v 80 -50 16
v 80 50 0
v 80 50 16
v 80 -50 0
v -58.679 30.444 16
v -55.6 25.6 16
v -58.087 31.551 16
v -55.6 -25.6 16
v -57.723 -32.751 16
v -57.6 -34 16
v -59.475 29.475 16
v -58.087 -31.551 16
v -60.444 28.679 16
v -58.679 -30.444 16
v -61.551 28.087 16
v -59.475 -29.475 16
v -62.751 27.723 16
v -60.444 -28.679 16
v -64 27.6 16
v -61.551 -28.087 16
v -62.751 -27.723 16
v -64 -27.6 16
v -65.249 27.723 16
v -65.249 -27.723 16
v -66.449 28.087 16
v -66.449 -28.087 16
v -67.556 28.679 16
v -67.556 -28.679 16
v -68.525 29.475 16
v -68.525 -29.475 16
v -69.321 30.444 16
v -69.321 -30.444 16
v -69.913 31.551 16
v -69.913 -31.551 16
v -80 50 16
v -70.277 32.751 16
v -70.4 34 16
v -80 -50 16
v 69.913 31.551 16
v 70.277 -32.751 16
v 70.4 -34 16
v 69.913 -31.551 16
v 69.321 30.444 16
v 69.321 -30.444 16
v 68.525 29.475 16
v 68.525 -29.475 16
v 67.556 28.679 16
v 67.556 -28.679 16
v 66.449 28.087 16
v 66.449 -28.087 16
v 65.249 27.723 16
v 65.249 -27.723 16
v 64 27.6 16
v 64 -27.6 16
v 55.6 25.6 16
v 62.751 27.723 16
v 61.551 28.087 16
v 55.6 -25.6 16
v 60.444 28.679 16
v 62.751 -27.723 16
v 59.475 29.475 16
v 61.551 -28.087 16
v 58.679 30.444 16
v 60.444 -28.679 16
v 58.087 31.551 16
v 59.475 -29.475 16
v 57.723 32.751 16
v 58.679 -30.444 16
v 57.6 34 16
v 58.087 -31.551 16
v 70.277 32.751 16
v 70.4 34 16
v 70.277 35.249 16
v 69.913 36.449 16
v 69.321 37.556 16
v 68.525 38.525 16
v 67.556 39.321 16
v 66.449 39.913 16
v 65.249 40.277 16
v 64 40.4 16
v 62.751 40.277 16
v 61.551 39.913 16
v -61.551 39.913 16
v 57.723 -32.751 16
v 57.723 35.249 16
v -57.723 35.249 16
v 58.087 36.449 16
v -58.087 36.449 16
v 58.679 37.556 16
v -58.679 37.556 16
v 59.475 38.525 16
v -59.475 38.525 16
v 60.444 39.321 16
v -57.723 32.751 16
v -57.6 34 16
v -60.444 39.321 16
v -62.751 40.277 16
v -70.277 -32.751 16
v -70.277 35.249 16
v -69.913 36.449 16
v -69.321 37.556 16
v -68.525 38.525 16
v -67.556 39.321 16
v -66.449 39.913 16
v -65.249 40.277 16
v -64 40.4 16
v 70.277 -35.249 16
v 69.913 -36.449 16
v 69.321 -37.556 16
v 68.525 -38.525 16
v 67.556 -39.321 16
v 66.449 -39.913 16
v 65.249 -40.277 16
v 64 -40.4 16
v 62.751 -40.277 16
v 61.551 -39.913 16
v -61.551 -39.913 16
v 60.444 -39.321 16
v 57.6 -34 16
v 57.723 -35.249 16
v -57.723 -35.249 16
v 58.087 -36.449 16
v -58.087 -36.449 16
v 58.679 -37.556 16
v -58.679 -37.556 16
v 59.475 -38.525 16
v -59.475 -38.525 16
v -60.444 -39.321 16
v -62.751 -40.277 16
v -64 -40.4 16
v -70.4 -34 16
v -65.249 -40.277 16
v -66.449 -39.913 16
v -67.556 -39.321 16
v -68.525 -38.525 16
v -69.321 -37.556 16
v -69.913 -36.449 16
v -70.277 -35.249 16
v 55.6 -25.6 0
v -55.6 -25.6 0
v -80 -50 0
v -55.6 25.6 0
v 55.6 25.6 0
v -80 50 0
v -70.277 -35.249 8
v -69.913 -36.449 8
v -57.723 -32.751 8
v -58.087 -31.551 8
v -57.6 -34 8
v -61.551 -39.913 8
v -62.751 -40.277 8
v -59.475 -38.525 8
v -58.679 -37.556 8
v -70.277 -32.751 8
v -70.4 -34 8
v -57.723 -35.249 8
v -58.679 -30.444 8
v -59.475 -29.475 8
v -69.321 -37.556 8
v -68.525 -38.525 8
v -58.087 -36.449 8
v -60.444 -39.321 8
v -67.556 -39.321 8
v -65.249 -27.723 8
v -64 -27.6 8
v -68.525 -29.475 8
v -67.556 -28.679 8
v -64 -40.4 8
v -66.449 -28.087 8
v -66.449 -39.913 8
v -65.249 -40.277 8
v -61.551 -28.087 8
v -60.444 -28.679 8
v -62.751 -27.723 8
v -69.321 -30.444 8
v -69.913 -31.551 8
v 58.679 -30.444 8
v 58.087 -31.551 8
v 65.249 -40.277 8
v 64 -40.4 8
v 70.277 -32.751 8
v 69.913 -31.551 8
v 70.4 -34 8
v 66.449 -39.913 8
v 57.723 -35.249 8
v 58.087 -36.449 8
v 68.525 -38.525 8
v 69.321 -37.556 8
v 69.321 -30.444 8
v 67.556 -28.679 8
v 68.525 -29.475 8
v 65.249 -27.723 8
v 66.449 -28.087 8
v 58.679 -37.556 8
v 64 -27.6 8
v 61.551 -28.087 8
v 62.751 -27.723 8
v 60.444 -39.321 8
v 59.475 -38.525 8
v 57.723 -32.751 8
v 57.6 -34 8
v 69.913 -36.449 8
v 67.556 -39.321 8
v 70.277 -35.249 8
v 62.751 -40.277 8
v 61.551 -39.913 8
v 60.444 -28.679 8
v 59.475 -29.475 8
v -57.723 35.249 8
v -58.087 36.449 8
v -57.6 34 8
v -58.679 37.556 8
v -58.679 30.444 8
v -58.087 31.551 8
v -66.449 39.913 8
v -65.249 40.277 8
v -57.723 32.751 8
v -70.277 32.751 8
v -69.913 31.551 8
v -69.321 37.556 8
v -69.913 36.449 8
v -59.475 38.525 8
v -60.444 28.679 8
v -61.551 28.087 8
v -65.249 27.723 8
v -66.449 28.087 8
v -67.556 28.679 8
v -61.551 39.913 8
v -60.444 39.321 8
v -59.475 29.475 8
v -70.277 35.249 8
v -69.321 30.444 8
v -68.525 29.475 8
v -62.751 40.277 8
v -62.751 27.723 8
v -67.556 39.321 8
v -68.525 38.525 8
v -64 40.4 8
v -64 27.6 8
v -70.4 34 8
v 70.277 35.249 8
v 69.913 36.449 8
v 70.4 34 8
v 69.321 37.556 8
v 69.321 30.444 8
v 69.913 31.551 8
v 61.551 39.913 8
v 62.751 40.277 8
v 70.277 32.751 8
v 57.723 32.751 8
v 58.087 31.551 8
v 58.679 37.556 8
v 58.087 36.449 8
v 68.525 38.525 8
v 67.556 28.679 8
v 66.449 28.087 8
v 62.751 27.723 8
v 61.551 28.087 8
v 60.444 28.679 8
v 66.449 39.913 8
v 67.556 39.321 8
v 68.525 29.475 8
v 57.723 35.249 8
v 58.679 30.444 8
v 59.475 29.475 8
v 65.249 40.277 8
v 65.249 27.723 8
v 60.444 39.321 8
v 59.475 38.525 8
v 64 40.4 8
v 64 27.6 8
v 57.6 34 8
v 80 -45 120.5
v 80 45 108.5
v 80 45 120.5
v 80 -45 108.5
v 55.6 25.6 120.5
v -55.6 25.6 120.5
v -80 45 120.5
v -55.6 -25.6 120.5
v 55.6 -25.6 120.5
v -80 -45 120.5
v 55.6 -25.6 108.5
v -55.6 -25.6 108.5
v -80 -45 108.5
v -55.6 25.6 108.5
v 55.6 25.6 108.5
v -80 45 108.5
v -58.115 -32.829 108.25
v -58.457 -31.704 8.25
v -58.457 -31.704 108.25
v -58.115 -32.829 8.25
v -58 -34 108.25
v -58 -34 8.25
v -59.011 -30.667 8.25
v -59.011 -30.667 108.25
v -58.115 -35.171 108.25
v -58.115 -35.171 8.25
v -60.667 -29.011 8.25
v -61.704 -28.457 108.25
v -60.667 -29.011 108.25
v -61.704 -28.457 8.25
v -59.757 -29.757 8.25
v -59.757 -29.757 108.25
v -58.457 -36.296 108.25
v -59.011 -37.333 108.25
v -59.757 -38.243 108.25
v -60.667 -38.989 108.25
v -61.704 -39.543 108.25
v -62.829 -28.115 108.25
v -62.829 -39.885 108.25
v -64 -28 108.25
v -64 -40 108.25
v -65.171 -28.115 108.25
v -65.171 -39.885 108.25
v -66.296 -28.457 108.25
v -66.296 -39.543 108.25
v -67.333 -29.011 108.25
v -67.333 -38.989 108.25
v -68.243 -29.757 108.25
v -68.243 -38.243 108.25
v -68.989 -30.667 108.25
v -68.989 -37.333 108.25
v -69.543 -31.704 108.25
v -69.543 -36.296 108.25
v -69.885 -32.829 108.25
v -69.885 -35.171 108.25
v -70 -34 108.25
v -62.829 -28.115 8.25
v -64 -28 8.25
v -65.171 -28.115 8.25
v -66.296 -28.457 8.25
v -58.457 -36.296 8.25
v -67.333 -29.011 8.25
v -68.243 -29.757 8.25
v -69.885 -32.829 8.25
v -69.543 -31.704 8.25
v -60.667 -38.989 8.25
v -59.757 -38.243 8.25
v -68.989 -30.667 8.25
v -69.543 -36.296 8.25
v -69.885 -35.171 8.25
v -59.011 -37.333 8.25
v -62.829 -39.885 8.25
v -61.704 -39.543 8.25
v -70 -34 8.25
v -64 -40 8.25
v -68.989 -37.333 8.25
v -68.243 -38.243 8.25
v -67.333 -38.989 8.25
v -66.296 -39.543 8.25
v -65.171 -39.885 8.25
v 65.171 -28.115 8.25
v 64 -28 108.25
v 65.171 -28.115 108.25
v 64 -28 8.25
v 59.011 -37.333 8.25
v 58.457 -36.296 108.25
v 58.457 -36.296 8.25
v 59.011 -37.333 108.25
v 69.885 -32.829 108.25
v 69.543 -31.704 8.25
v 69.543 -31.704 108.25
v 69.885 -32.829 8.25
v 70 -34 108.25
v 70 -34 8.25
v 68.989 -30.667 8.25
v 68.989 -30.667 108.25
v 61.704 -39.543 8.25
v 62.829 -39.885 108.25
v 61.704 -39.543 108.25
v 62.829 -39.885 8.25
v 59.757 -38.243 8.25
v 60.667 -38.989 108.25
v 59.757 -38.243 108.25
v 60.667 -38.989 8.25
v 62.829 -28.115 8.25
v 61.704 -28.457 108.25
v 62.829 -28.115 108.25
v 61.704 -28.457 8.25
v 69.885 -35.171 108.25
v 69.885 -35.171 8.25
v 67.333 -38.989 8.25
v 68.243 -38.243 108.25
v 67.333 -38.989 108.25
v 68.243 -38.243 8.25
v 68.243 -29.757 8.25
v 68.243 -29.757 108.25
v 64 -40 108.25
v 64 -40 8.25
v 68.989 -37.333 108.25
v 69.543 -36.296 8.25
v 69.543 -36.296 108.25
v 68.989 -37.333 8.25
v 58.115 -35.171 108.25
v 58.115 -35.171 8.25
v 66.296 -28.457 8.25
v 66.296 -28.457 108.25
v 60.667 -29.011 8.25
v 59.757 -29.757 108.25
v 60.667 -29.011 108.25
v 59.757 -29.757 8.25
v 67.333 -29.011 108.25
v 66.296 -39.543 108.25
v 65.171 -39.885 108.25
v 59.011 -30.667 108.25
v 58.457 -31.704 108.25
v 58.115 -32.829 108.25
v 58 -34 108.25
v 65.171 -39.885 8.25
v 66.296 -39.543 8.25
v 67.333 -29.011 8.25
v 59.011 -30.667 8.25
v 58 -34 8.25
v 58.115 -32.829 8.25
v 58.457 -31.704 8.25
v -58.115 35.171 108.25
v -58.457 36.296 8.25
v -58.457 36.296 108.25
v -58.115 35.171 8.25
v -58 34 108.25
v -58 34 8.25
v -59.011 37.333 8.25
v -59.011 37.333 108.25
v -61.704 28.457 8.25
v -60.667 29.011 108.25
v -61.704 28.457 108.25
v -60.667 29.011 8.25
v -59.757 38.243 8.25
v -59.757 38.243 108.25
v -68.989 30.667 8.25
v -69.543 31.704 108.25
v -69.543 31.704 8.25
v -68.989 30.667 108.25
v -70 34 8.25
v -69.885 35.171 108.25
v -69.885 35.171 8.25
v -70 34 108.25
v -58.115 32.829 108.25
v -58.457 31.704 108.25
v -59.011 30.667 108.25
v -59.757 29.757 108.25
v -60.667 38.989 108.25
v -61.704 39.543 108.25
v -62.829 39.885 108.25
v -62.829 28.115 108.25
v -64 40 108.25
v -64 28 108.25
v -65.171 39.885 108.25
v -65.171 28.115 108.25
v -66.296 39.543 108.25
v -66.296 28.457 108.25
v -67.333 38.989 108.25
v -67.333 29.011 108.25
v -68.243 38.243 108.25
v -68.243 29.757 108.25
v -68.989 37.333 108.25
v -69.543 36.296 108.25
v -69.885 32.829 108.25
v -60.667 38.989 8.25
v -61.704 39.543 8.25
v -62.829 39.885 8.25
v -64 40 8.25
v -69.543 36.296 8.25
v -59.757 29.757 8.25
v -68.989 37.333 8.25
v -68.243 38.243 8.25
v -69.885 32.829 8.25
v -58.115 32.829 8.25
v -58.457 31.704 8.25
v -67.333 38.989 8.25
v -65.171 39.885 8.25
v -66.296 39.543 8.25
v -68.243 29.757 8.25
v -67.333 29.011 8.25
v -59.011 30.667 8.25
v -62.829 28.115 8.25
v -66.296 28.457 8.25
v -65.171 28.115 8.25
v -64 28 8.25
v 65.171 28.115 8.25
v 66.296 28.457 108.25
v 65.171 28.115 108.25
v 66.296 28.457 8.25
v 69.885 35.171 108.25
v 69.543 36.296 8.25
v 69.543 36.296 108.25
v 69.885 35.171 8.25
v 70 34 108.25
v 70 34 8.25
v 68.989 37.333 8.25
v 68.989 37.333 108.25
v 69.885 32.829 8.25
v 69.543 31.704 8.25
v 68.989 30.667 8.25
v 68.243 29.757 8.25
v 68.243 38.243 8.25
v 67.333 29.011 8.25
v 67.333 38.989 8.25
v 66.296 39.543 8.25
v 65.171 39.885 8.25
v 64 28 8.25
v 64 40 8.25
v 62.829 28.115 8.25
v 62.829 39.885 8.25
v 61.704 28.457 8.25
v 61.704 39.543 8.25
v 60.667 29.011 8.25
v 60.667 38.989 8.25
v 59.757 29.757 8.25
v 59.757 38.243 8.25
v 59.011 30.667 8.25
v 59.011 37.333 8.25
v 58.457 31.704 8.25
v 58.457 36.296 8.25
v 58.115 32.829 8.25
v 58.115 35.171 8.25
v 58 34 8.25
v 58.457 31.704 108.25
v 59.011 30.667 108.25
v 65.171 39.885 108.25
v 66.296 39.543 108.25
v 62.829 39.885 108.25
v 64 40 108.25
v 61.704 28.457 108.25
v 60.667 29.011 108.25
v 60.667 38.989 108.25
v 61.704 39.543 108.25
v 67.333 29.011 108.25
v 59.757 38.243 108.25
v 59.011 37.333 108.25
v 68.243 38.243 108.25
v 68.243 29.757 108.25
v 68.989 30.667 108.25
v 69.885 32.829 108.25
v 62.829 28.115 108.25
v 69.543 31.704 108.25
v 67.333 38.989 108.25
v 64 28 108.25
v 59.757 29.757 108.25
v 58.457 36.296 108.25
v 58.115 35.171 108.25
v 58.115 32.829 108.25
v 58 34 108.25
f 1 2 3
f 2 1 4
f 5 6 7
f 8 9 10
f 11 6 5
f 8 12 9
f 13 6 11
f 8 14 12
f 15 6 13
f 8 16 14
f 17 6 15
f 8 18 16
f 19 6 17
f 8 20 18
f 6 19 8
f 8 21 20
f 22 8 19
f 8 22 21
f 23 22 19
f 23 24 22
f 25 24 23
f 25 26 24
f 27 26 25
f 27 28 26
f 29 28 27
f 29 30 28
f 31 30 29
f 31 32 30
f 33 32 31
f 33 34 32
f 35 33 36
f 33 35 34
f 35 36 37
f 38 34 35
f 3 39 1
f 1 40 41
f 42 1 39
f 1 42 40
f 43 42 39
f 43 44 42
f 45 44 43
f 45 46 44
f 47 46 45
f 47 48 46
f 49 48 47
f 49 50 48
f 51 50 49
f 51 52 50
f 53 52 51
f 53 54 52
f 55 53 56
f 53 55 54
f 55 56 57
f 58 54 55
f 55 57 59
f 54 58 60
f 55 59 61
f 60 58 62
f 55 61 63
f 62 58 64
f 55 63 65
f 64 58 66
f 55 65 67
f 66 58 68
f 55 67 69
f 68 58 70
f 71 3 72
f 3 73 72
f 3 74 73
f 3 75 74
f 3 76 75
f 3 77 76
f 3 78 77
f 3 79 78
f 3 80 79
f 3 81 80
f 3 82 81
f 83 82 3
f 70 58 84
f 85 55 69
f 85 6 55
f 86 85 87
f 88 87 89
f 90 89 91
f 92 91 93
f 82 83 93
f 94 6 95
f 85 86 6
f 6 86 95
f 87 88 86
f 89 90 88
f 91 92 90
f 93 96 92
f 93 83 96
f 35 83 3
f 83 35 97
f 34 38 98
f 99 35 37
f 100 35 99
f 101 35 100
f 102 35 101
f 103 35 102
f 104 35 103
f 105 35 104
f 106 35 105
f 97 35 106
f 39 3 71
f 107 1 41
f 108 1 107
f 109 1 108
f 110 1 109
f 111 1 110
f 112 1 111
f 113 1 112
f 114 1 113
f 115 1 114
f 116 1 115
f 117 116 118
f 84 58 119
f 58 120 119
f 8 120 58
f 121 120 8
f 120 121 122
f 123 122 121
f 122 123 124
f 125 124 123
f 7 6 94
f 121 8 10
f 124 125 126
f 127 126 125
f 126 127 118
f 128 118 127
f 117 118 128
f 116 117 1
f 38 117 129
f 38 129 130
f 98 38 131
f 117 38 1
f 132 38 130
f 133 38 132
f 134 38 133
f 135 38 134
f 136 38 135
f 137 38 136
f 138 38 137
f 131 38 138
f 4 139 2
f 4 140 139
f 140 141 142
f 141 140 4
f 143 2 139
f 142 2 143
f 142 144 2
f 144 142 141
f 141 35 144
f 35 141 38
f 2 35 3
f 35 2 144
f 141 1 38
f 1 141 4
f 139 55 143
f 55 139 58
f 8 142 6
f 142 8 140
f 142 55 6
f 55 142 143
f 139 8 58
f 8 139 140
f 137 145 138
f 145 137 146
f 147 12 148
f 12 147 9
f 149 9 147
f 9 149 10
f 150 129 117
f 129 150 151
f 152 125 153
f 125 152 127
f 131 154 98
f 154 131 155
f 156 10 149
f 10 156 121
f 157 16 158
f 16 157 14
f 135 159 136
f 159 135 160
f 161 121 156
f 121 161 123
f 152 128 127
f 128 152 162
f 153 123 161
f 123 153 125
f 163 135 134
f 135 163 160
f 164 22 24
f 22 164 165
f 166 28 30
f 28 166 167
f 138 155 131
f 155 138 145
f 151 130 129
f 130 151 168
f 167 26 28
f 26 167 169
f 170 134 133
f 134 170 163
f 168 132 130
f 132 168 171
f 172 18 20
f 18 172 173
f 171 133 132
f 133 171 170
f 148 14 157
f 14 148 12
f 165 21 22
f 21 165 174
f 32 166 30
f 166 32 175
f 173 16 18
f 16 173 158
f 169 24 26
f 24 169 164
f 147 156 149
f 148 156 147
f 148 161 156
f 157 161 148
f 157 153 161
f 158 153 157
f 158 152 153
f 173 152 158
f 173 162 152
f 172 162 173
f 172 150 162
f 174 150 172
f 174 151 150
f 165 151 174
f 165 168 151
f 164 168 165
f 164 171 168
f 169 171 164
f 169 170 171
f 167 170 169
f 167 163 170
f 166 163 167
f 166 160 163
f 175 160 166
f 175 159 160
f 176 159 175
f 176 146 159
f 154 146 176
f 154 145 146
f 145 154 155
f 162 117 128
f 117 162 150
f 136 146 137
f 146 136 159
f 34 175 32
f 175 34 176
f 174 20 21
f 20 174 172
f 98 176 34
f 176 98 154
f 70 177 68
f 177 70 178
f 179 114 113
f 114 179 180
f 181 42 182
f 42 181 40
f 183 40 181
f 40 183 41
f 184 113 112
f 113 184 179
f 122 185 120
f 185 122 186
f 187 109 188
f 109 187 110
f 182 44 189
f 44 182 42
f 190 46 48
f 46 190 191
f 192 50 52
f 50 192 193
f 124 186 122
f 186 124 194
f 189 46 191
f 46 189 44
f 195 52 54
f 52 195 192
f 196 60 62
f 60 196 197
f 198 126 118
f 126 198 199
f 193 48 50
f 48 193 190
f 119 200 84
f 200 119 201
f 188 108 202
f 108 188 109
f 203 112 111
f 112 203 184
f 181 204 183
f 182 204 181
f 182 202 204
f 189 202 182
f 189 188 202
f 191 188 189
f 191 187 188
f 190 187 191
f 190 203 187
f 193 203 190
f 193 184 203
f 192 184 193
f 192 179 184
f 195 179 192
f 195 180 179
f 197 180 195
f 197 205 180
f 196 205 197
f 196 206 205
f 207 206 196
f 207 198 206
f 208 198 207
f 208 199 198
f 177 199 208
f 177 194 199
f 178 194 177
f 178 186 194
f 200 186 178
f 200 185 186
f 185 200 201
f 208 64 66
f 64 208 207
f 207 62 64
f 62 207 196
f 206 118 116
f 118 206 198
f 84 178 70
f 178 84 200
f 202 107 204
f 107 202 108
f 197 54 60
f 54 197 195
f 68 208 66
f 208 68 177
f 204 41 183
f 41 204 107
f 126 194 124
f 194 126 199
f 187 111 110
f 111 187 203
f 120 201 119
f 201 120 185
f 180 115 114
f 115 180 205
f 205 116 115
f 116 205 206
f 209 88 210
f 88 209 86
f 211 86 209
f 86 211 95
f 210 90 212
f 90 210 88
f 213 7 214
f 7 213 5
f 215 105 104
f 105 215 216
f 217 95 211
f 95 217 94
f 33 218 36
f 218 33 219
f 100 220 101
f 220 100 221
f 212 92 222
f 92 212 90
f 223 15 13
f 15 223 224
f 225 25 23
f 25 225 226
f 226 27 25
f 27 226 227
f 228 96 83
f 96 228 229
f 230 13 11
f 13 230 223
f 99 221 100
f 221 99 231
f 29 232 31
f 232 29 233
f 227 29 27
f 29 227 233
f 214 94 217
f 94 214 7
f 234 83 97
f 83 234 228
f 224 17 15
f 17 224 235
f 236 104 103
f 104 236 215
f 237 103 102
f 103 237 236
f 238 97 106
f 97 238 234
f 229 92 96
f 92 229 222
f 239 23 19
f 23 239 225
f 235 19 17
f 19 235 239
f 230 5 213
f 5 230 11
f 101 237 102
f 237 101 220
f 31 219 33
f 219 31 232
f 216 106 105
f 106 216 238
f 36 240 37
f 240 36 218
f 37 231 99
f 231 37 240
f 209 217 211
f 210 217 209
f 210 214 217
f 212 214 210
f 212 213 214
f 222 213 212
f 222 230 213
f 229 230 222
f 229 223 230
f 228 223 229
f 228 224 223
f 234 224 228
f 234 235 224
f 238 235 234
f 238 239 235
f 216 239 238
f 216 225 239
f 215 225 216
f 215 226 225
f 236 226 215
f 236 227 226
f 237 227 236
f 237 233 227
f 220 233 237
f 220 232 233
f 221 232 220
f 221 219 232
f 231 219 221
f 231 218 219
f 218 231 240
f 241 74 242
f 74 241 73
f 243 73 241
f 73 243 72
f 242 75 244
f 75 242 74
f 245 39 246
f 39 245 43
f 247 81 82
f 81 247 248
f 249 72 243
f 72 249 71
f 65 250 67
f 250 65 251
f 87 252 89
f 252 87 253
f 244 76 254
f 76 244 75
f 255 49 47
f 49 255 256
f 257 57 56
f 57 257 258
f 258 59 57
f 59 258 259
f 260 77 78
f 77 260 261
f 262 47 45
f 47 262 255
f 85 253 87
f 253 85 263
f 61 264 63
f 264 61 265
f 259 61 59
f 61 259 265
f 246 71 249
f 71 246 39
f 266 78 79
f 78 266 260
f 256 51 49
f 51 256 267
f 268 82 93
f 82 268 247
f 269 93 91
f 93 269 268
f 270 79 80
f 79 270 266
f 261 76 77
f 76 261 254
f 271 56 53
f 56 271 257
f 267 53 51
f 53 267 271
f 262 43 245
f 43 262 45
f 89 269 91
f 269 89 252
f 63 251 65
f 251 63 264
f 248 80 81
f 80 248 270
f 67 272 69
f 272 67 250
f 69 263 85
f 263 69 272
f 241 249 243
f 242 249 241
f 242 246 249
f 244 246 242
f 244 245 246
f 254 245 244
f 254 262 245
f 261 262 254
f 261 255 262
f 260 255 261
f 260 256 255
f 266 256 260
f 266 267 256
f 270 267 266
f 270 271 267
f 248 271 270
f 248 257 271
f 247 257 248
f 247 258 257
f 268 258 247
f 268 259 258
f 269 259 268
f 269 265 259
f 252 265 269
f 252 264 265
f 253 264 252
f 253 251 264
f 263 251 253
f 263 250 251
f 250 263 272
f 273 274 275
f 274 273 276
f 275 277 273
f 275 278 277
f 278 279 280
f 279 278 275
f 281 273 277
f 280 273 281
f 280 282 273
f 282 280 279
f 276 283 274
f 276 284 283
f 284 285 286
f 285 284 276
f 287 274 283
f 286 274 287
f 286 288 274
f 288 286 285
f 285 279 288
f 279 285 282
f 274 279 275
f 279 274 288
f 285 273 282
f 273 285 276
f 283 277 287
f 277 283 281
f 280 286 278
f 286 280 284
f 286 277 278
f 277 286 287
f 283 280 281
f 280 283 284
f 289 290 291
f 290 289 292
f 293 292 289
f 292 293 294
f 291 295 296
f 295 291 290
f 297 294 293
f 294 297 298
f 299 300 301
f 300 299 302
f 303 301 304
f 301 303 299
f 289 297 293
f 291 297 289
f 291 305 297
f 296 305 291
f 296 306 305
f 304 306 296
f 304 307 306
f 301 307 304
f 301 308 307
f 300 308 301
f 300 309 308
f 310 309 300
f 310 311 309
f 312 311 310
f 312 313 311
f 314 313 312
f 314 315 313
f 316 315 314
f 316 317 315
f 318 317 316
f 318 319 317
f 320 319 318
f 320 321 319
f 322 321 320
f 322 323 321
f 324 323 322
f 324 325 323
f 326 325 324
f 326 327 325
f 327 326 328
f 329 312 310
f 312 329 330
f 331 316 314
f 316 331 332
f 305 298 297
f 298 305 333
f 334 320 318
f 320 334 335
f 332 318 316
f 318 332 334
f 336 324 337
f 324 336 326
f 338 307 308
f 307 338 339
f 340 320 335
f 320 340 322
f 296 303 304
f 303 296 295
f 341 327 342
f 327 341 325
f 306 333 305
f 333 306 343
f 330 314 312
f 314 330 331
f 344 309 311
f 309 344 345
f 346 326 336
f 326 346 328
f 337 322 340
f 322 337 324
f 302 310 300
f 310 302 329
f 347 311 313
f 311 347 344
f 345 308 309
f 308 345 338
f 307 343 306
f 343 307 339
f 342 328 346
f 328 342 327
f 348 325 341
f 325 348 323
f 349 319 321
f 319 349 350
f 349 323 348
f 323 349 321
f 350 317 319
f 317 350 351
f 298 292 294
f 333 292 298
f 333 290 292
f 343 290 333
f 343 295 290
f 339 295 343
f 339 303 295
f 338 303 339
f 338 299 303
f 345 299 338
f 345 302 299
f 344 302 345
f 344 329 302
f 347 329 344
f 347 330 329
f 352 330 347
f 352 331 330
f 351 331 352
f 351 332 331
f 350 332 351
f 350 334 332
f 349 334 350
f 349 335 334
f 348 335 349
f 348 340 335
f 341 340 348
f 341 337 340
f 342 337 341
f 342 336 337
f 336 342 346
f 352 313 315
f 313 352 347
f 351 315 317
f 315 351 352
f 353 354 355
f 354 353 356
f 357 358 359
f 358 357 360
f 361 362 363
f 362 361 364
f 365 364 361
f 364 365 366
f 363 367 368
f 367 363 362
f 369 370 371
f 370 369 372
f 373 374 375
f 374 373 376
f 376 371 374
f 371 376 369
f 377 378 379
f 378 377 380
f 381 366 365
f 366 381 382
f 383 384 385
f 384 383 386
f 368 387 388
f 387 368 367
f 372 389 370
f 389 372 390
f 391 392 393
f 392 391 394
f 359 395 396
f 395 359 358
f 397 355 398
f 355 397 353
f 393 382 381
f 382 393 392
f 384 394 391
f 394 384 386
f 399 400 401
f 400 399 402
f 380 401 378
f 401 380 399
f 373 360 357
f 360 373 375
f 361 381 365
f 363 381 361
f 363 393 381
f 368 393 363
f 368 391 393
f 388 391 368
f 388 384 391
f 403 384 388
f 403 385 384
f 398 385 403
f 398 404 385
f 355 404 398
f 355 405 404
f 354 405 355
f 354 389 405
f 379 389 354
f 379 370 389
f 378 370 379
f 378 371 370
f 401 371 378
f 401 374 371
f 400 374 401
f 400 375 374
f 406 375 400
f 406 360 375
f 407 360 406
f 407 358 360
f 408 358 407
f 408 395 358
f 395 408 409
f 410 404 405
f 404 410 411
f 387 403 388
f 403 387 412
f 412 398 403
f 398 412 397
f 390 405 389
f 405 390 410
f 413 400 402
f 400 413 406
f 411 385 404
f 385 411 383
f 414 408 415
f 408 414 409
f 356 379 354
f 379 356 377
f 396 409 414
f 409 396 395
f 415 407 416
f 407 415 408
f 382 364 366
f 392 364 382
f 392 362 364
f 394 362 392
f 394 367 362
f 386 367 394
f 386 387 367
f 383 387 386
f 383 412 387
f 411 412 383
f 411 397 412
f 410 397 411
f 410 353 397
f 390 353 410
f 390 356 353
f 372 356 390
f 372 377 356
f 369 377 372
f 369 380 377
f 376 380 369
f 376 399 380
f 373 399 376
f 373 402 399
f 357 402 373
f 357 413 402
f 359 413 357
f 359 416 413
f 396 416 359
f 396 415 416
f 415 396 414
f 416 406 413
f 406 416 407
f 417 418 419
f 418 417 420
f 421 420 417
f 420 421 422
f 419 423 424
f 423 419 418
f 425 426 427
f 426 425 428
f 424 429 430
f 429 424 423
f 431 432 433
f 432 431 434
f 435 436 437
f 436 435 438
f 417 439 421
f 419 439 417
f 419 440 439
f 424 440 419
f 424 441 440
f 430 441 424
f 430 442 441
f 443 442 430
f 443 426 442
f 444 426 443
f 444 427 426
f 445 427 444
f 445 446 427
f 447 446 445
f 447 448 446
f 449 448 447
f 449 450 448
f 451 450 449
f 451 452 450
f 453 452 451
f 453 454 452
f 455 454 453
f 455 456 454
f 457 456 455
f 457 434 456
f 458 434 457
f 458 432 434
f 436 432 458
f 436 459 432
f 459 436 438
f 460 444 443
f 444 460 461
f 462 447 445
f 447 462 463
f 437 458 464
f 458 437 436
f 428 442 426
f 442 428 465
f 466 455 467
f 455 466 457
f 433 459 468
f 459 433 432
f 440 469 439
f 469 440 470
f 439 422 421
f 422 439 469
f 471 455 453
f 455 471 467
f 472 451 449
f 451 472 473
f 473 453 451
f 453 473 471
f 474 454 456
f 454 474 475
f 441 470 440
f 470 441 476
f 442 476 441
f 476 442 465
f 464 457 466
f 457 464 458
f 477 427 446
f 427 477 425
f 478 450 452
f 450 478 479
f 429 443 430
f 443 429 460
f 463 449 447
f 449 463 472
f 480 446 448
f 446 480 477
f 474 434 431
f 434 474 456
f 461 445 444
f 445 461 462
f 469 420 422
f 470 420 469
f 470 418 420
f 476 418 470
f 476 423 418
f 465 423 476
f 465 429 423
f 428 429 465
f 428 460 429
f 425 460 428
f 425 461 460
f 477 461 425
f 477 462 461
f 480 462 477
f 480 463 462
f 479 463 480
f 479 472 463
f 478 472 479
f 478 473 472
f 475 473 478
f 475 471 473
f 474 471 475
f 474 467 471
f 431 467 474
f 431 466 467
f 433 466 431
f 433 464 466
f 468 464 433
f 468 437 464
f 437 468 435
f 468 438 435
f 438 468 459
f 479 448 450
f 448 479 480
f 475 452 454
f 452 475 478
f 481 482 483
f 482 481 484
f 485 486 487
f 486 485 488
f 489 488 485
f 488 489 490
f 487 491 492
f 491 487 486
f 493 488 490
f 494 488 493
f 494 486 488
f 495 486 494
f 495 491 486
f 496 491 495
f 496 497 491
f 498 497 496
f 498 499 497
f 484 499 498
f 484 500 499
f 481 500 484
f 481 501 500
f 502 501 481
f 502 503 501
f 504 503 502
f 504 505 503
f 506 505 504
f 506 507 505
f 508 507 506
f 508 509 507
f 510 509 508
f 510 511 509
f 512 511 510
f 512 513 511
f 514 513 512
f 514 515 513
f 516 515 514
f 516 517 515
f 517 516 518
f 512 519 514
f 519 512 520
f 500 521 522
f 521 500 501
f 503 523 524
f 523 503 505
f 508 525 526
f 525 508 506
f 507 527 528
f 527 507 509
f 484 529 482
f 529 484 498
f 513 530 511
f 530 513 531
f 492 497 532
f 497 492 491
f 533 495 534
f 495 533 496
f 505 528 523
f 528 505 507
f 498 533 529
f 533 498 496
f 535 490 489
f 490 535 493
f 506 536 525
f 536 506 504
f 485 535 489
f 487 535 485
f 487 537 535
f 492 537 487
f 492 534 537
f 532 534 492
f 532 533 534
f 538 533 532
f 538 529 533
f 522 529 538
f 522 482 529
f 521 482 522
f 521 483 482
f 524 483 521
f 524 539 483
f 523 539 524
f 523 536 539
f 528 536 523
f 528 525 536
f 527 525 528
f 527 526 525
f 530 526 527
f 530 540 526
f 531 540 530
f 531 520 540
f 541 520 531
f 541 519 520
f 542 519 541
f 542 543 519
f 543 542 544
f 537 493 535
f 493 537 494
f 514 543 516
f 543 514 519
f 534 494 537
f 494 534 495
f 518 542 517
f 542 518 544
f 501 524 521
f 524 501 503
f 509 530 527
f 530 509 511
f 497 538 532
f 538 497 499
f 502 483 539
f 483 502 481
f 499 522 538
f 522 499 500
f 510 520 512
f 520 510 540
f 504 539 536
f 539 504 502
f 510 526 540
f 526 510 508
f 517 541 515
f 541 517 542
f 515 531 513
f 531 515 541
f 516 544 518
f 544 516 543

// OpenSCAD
$fn = 32;

// ------------------------------------------------------------------------
// Frame cube: base 160 x 100 mm, posts 100 mm tall
// Every part is its own module, assembly() places every instance.
// ------------------------------------------------------------------------

// --- part 1 ---
module base_frame() {
  difference() {
    translate([-80, -50, 0]) cube([160, 100, 16]);
    translate([-55.6, -25.6, -1]) cube([111.2, 51.2, 18]);
    translate([-64, -34, 8]) cylinder(h = 9, d = 12.8);
    translate([64, -34, 8]) cylinder(h = 9, d = 12.8);
    translate([-64, 34, 8]) cylinder(h = 9, d = 12.8);
    translate([64, 34, 8]) cylinder(h = 9, d = 12.8);
  }
}

// --- part 2 ---
module corner_post() {
  cylinder(h = 100, d = 12);
}

// --- part 3 ---
module top_frame() {
  difference() {
    translate([-80, -45, 0]) cube([160, 90, 12]);
    translate([-55.6, -25.6, -1]) cube([111.2, 51.2, 14]);
  }
}

// --- assembly ---
module assembly() {
  color([0.80, 0.24, 0.20]) translate([0, 0, 0]) rotate([0, 0, 0]) base_frame();
  color([0.20, 0.45, 0.75]) translate([-64, -34, 8.25]) rotate([0, 0, 0]) corner_post();
  color([0.25, 0.62, 0.32]) translate([64, -34, 8.25]) rotate([0, 0, 0]) corner_post();
  color([0.92, 0.70, 0.18]) translate([-64, 34, 8.25]) rotate([0, 0, 0]) corner_post();
  color([0.58, 0.35, 0.70]) translate([64, 34, 8.25]) rotate([0, 0, 0]) corner_post();
  color([0.16, 0.66, 0.66]) translate([0, 0, 108.5]) rotate([0, 0, 0]) top_frame();
}

assembly();
